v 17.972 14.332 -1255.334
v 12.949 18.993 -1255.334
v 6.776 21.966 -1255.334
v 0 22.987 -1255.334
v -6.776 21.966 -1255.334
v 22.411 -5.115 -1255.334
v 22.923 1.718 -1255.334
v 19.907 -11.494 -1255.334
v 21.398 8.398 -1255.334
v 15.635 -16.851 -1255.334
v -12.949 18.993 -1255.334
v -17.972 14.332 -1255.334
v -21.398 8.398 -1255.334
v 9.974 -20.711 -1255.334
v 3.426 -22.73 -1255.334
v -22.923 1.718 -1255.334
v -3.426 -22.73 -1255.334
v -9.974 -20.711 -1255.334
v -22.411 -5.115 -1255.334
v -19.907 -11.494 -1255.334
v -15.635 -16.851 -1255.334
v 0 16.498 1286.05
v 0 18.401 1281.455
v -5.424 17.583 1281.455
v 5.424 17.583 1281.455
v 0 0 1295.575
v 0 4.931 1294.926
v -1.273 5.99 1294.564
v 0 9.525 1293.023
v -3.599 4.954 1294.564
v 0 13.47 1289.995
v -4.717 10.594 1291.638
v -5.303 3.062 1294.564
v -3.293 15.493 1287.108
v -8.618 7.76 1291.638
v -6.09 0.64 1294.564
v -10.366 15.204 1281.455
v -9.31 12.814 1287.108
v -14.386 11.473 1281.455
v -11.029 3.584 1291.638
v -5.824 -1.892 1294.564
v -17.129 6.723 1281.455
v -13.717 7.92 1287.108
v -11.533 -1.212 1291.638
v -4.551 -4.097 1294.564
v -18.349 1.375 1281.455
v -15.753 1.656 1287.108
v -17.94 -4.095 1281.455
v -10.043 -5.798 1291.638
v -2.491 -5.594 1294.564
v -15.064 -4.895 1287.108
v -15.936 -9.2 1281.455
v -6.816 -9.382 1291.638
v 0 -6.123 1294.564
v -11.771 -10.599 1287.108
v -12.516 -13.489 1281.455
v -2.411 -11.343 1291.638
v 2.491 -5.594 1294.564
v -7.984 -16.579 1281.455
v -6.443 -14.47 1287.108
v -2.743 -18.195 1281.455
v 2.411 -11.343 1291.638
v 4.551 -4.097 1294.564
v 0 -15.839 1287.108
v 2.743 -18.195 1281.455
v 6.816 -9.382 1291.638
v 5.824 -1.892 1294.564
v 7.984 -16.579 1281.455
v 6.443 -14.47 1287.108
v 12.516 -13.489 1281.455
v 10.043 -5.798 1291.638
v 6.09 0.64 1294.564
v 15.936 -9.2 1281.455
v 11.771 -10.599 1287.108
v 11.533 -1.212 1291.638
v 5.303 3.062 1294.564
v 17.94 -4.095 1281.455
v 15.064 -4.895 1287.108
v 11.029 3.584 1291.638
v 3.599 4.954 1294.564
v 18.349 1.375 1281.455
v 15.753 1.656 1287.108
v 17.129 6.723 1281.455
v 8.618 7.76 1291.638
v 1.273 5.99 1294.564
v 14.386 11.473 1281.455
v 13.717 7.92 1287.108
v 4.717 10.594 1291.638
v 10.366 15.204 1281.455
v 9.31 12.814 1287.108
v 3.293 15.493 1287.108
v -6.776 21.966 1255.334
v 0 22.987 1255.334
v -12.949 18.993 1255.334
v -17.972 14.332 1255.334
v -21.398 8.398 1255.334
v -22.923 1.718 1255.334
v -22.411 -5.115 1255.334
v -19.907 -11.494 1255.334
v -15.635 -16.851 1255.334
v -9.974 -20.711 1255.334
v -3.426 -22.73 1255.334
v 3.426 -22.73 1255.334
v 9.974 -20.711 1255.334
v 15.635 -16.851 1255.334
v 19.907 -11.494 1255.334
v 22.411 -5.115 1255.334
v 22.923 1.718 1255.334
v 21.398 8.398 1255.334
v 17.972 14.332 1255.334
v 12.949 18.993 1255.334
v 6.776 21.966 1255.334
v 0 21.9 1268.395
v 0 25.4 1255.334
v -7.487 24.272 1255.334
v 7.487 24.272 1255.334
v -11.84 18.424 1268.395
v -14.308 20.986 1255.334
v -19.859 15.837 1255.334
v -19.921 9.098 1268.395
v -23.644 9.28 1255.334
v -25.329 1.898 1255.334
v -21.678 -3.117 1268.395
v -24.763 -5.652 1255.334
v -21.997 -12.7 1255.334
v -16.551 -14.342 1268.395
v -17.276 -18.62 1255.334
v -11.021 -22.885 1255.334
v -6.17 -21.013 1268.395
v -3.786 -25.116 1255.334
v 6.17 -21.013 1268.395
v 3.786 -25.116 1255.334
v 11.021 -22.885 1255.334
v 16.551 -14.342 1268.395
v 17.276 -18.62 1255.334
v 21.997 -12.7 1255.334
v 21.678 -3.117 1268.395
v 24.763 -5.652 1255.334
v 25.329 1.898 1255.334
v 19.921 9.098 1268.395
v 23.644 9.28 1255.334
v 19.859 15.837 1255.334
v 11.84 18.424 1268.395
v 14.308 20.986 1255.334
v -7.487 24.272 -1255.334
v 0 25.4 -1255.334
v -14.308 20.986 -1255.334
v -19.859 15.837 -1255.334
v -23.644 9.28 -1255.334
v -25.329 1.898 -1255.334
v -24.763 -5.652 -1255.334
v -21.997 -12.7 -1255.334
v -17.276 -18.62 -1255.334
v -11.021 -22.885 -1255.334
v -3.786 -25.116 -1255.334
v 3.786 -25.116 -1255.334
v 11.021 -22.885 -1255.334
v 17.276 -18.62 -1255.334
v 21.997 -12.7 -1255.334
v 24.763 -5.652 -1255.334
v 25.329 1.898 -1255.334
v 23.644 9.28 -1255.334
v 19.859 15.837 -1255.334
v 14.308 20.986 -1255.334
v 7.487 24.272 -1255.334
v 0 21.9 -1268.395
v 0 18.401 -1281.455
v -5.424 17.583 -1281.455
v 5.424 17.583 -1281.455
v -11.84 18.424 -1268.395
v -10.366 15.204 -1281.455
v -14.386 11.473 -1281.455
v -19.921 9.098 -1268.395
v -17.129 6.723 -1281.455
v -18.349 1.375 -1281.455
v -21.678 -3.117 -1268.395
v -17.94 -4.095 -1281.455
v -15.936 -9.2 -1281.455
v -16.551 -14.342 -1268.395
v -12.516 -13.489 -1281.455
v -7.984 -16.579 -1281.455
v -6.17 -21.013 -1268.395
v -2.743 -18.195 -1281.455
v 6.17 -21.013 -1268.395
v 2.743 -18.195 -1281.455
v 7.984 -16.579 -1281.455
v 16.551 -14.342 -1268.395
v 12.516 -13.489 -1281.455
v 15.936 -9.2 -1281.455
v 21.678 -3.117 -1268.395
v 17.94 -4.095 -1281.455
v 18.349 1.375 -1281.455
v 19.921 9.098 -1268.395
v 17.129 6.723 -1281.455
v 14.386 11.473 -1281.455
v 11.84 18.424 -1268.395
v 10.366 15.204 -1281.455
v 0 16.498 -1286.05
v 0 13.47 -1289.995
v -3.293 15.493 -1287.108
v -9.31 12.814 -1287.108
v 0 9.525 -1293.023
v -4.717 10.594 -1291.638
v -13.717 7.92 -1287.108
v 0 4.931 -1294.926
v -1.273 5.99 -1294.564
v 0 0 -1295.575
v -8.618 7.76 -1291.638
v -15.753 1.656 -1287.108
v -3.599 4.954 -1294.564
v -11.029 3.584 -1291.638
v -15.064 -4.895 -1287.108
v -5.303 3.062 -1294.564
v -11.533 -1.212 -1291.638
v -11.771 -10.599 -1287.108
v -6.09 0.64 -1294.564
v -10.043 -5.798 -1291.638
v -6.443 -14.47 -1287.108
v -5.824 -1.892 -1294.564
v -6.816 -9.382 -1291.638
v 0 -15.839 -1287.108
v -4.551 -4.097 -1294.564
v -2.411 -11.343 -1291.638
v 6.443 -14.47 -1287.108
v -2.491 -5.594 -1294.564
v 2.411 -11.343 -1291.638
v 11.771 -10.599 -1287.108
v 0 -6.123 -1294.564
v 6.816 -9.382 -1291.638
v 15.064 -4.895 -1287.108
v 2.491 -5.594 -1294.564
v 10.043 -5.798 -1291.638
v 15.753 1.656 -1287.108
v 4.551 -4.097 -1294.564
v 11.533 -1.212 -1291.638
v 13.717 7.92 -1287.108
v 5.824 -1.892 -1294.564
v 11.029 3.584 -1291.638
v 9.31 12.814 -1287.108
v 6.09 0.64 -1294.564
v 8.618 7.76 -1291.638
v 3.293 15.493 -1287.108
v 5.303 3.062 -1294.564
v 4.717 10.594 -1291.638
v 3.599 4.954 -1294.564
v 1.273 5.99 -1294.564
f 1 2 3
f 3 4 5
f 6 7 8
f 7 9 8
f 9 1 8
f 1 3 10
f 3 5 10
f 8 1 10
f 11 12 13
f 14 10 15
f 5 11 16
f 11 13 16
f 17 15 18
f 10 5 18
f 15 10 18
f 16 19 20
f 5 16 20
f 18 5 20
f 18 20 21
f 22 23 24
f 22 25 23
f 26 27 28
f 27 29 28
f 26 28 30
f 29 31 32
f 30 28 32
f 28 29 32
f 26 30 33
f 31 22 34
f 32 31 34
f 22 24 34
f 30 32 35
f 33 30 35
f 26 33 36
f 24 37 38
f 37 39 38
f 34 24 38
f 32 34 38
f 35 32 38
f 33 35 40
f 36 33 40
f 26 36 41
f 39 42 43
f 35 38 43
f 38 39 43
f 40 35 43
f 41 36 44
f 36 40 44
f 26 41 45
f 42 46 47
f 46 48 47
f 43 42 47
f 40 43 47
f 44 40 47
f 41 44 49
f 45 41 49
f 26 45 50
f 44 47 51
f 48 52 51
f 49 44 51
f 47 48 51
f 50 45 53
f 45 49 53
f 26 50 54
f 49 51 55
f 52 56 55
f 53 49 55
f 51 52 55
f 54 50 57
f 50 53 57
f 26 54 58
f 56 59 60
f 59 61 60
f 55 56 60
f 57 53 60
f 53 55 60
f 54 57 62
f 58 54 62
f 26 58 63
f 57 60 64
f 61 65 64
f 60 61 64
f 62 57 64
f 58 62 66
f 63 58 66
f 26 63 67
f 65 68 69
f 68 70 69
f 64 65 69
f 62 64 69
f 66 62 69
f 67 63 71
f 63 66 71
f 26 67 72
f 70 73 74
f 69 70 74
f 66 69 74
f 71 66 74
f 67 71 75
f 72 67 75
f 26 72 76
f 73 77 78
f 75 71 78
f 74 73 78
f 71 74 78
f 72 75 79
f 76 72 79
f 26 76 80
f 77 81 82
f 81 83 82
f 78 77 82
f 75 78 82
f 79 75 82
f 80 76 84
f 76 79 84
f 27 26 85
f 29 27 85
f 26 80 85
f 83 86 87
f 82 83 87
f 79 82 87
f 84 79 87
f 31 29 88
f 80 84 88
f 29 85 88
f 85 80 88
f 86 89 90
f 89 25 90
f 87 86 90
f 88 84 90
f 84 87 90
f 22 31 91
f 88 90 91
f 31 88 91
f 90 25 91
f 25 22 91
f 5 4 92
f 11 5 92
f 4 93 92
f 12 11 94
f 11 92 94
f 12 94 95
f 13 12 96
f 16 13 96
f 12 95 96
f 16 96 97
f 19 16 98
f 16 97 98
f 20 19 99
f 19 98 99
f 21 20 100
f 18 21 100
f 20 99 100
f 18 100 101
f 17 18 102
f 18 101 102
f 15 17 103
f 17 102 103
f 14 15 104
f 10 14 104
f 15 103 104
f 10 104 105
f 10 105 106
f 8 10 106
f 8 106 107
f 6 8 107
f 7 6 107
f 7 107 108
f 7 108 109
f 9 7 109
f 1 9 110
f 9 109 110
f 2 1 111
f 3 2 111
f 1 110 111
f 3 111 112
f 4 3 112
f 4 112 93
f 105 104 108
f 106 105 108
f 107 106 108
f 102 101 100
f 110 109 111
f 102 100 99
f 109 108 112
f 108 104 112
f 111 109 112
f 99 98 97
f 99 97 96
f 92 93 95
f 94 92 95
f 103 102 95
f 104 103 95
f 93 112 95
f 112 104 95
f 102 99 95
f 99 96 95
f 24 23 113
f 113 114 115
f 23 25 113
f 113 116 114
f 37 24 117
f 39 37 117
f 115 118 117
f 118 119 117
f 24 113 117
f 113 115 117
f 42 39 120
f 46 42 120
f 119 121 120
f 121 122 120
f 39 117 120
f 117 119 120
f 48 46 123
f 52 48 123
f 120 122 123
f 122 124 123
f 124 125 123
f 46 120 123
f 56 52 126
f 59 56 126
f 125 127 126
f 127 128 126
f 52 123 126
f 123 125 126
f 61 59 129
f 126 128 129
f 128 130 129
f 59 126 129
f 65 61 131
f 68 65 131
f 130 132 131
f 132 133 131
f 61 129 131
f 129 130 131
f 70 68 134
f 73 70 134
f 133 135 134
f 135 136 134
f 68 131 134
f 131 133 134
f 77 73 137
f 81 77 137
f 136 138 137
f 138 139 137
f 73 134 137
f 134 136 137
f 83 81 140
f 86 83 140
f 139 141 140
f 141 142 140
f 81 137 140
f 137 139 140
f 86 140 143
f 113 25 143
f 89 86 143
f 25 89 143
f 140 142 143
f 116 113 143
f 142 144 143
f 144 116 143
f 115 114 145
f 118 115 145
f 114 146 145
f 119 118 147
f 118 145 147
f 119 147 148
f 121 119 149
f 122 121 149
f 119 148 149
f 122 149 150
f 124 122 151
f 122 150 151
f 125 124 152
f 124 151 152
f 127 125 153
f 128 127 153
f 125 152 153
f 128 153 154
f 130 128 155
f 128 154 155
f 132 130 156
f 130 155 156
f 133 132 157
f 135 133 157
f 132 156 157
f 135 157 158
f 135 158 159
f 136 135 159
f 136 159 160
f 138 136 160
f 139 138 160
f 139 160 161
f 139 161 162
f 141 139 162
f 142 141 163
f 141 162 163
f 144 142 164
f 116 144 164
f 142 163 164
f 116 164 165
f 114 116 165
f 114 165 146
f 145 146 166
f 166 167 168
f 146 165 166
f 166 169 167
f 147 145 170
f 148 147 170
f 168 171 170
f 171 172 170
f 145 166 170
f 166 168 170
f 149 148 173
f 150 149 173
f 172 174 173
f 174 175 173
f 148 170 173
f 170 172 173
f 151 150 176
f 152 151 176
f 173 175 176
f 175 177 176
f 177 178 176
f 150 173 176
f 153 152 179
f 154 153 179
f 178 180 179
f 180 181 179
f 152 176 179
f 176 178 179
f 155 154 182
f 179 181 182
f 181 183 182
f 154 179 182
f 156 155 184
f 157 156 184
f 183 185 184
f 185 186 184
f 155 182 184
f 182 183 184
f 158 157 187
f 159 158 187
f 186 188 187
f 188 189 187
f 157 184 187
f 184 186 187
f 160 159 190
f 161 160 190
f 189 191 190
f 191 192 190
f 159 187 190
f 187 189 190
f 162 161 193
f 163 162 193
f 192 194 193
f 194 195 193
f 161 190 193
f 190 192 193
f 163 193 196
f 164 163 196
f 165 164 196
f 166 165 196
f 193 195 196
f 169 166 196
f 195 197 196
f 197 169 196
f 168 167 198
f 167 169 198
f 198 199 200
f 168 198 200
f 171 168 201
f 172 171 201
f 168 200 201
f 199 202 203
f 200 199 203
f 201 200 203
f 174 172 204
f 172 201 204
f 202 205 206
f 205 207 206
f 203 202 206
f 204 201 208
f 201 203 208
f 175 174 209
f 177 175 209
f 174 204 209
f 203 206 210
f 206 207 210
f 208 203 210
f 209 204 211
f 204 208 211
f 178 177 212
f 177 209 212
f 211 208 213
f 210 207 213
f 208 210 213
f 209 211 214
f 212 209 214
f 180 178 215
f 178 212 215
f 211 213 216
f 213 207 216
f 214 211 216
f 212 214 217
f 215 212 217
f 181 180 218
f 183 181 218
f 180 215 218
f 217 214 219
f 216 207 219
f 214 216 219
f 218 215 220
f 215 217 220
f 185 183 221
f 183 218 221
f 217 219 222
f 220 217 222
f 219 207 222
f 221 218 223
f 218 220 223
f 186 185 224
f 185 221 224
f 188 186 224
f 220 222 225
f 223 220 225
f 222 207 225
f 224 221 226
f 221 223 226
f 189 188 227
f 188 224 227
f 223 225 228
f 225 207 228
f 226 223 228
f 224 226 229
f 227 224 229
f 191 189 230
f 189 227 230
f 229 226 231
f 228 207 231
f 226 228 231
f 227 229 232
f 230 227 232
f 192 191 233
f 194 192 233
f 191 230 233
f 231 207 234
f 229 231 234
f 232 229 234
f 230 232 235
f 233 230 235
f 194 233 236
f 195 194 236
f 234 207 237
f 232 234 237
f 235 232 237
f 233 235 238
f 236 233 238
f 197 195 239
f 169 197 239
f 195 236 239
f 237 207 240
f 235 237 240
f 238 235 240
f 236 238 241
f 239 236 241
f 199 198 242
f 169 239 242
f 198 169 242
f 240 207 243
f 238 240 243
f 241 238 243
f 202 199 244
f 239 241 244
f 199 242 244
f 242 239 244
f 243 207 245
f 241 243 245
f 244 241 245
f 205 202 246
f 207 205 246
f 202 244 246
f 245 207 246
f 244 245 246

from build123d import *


with BuildPart() as part:
    # Sketch2 → Revolve1 (revolve)
    with BuildSketch(Plane(origin=(0, 0, 0), x_dir=(0, 0, -1), z_dir=(1, 0, 0))):
        with BuildLine():
            Line((1255.334291848, 25.4), (1281.455337206, 18.400886991))
            ThreePointArc((1281.455337206, 18.400886991), (1291.638215529, 11.596905223), (1295.574834397, 0))
            Line((1295.574834397, 0), (1255.334291848, 0))
            Line((1255.334291848, 0), (1255.334291848, 22.987))
            Line((1255.334291848, 22.987), (-1255.334291848, 22.987))
            Line((-1255.334291848, 22.987), (-1255.334291848, 0))
            Line((-1255.334291848, 0), (-1295.574834397, 0))
            ThreePointArc((-1295.574834397, 0), (-1291.638215529, 11.596905223), (-1281.455337206, 18.400886991))
            Line((-1281.455337206, 18.400886991), (-1255.334291848, 25.4))
            Line((-1255.334291848, 25.4), (1255.334291848, 25.4))
        make_face()
    revolve(axis=Axis((0, 0, -1295.574834397), (0, 0, 1)))


solid = part.part
